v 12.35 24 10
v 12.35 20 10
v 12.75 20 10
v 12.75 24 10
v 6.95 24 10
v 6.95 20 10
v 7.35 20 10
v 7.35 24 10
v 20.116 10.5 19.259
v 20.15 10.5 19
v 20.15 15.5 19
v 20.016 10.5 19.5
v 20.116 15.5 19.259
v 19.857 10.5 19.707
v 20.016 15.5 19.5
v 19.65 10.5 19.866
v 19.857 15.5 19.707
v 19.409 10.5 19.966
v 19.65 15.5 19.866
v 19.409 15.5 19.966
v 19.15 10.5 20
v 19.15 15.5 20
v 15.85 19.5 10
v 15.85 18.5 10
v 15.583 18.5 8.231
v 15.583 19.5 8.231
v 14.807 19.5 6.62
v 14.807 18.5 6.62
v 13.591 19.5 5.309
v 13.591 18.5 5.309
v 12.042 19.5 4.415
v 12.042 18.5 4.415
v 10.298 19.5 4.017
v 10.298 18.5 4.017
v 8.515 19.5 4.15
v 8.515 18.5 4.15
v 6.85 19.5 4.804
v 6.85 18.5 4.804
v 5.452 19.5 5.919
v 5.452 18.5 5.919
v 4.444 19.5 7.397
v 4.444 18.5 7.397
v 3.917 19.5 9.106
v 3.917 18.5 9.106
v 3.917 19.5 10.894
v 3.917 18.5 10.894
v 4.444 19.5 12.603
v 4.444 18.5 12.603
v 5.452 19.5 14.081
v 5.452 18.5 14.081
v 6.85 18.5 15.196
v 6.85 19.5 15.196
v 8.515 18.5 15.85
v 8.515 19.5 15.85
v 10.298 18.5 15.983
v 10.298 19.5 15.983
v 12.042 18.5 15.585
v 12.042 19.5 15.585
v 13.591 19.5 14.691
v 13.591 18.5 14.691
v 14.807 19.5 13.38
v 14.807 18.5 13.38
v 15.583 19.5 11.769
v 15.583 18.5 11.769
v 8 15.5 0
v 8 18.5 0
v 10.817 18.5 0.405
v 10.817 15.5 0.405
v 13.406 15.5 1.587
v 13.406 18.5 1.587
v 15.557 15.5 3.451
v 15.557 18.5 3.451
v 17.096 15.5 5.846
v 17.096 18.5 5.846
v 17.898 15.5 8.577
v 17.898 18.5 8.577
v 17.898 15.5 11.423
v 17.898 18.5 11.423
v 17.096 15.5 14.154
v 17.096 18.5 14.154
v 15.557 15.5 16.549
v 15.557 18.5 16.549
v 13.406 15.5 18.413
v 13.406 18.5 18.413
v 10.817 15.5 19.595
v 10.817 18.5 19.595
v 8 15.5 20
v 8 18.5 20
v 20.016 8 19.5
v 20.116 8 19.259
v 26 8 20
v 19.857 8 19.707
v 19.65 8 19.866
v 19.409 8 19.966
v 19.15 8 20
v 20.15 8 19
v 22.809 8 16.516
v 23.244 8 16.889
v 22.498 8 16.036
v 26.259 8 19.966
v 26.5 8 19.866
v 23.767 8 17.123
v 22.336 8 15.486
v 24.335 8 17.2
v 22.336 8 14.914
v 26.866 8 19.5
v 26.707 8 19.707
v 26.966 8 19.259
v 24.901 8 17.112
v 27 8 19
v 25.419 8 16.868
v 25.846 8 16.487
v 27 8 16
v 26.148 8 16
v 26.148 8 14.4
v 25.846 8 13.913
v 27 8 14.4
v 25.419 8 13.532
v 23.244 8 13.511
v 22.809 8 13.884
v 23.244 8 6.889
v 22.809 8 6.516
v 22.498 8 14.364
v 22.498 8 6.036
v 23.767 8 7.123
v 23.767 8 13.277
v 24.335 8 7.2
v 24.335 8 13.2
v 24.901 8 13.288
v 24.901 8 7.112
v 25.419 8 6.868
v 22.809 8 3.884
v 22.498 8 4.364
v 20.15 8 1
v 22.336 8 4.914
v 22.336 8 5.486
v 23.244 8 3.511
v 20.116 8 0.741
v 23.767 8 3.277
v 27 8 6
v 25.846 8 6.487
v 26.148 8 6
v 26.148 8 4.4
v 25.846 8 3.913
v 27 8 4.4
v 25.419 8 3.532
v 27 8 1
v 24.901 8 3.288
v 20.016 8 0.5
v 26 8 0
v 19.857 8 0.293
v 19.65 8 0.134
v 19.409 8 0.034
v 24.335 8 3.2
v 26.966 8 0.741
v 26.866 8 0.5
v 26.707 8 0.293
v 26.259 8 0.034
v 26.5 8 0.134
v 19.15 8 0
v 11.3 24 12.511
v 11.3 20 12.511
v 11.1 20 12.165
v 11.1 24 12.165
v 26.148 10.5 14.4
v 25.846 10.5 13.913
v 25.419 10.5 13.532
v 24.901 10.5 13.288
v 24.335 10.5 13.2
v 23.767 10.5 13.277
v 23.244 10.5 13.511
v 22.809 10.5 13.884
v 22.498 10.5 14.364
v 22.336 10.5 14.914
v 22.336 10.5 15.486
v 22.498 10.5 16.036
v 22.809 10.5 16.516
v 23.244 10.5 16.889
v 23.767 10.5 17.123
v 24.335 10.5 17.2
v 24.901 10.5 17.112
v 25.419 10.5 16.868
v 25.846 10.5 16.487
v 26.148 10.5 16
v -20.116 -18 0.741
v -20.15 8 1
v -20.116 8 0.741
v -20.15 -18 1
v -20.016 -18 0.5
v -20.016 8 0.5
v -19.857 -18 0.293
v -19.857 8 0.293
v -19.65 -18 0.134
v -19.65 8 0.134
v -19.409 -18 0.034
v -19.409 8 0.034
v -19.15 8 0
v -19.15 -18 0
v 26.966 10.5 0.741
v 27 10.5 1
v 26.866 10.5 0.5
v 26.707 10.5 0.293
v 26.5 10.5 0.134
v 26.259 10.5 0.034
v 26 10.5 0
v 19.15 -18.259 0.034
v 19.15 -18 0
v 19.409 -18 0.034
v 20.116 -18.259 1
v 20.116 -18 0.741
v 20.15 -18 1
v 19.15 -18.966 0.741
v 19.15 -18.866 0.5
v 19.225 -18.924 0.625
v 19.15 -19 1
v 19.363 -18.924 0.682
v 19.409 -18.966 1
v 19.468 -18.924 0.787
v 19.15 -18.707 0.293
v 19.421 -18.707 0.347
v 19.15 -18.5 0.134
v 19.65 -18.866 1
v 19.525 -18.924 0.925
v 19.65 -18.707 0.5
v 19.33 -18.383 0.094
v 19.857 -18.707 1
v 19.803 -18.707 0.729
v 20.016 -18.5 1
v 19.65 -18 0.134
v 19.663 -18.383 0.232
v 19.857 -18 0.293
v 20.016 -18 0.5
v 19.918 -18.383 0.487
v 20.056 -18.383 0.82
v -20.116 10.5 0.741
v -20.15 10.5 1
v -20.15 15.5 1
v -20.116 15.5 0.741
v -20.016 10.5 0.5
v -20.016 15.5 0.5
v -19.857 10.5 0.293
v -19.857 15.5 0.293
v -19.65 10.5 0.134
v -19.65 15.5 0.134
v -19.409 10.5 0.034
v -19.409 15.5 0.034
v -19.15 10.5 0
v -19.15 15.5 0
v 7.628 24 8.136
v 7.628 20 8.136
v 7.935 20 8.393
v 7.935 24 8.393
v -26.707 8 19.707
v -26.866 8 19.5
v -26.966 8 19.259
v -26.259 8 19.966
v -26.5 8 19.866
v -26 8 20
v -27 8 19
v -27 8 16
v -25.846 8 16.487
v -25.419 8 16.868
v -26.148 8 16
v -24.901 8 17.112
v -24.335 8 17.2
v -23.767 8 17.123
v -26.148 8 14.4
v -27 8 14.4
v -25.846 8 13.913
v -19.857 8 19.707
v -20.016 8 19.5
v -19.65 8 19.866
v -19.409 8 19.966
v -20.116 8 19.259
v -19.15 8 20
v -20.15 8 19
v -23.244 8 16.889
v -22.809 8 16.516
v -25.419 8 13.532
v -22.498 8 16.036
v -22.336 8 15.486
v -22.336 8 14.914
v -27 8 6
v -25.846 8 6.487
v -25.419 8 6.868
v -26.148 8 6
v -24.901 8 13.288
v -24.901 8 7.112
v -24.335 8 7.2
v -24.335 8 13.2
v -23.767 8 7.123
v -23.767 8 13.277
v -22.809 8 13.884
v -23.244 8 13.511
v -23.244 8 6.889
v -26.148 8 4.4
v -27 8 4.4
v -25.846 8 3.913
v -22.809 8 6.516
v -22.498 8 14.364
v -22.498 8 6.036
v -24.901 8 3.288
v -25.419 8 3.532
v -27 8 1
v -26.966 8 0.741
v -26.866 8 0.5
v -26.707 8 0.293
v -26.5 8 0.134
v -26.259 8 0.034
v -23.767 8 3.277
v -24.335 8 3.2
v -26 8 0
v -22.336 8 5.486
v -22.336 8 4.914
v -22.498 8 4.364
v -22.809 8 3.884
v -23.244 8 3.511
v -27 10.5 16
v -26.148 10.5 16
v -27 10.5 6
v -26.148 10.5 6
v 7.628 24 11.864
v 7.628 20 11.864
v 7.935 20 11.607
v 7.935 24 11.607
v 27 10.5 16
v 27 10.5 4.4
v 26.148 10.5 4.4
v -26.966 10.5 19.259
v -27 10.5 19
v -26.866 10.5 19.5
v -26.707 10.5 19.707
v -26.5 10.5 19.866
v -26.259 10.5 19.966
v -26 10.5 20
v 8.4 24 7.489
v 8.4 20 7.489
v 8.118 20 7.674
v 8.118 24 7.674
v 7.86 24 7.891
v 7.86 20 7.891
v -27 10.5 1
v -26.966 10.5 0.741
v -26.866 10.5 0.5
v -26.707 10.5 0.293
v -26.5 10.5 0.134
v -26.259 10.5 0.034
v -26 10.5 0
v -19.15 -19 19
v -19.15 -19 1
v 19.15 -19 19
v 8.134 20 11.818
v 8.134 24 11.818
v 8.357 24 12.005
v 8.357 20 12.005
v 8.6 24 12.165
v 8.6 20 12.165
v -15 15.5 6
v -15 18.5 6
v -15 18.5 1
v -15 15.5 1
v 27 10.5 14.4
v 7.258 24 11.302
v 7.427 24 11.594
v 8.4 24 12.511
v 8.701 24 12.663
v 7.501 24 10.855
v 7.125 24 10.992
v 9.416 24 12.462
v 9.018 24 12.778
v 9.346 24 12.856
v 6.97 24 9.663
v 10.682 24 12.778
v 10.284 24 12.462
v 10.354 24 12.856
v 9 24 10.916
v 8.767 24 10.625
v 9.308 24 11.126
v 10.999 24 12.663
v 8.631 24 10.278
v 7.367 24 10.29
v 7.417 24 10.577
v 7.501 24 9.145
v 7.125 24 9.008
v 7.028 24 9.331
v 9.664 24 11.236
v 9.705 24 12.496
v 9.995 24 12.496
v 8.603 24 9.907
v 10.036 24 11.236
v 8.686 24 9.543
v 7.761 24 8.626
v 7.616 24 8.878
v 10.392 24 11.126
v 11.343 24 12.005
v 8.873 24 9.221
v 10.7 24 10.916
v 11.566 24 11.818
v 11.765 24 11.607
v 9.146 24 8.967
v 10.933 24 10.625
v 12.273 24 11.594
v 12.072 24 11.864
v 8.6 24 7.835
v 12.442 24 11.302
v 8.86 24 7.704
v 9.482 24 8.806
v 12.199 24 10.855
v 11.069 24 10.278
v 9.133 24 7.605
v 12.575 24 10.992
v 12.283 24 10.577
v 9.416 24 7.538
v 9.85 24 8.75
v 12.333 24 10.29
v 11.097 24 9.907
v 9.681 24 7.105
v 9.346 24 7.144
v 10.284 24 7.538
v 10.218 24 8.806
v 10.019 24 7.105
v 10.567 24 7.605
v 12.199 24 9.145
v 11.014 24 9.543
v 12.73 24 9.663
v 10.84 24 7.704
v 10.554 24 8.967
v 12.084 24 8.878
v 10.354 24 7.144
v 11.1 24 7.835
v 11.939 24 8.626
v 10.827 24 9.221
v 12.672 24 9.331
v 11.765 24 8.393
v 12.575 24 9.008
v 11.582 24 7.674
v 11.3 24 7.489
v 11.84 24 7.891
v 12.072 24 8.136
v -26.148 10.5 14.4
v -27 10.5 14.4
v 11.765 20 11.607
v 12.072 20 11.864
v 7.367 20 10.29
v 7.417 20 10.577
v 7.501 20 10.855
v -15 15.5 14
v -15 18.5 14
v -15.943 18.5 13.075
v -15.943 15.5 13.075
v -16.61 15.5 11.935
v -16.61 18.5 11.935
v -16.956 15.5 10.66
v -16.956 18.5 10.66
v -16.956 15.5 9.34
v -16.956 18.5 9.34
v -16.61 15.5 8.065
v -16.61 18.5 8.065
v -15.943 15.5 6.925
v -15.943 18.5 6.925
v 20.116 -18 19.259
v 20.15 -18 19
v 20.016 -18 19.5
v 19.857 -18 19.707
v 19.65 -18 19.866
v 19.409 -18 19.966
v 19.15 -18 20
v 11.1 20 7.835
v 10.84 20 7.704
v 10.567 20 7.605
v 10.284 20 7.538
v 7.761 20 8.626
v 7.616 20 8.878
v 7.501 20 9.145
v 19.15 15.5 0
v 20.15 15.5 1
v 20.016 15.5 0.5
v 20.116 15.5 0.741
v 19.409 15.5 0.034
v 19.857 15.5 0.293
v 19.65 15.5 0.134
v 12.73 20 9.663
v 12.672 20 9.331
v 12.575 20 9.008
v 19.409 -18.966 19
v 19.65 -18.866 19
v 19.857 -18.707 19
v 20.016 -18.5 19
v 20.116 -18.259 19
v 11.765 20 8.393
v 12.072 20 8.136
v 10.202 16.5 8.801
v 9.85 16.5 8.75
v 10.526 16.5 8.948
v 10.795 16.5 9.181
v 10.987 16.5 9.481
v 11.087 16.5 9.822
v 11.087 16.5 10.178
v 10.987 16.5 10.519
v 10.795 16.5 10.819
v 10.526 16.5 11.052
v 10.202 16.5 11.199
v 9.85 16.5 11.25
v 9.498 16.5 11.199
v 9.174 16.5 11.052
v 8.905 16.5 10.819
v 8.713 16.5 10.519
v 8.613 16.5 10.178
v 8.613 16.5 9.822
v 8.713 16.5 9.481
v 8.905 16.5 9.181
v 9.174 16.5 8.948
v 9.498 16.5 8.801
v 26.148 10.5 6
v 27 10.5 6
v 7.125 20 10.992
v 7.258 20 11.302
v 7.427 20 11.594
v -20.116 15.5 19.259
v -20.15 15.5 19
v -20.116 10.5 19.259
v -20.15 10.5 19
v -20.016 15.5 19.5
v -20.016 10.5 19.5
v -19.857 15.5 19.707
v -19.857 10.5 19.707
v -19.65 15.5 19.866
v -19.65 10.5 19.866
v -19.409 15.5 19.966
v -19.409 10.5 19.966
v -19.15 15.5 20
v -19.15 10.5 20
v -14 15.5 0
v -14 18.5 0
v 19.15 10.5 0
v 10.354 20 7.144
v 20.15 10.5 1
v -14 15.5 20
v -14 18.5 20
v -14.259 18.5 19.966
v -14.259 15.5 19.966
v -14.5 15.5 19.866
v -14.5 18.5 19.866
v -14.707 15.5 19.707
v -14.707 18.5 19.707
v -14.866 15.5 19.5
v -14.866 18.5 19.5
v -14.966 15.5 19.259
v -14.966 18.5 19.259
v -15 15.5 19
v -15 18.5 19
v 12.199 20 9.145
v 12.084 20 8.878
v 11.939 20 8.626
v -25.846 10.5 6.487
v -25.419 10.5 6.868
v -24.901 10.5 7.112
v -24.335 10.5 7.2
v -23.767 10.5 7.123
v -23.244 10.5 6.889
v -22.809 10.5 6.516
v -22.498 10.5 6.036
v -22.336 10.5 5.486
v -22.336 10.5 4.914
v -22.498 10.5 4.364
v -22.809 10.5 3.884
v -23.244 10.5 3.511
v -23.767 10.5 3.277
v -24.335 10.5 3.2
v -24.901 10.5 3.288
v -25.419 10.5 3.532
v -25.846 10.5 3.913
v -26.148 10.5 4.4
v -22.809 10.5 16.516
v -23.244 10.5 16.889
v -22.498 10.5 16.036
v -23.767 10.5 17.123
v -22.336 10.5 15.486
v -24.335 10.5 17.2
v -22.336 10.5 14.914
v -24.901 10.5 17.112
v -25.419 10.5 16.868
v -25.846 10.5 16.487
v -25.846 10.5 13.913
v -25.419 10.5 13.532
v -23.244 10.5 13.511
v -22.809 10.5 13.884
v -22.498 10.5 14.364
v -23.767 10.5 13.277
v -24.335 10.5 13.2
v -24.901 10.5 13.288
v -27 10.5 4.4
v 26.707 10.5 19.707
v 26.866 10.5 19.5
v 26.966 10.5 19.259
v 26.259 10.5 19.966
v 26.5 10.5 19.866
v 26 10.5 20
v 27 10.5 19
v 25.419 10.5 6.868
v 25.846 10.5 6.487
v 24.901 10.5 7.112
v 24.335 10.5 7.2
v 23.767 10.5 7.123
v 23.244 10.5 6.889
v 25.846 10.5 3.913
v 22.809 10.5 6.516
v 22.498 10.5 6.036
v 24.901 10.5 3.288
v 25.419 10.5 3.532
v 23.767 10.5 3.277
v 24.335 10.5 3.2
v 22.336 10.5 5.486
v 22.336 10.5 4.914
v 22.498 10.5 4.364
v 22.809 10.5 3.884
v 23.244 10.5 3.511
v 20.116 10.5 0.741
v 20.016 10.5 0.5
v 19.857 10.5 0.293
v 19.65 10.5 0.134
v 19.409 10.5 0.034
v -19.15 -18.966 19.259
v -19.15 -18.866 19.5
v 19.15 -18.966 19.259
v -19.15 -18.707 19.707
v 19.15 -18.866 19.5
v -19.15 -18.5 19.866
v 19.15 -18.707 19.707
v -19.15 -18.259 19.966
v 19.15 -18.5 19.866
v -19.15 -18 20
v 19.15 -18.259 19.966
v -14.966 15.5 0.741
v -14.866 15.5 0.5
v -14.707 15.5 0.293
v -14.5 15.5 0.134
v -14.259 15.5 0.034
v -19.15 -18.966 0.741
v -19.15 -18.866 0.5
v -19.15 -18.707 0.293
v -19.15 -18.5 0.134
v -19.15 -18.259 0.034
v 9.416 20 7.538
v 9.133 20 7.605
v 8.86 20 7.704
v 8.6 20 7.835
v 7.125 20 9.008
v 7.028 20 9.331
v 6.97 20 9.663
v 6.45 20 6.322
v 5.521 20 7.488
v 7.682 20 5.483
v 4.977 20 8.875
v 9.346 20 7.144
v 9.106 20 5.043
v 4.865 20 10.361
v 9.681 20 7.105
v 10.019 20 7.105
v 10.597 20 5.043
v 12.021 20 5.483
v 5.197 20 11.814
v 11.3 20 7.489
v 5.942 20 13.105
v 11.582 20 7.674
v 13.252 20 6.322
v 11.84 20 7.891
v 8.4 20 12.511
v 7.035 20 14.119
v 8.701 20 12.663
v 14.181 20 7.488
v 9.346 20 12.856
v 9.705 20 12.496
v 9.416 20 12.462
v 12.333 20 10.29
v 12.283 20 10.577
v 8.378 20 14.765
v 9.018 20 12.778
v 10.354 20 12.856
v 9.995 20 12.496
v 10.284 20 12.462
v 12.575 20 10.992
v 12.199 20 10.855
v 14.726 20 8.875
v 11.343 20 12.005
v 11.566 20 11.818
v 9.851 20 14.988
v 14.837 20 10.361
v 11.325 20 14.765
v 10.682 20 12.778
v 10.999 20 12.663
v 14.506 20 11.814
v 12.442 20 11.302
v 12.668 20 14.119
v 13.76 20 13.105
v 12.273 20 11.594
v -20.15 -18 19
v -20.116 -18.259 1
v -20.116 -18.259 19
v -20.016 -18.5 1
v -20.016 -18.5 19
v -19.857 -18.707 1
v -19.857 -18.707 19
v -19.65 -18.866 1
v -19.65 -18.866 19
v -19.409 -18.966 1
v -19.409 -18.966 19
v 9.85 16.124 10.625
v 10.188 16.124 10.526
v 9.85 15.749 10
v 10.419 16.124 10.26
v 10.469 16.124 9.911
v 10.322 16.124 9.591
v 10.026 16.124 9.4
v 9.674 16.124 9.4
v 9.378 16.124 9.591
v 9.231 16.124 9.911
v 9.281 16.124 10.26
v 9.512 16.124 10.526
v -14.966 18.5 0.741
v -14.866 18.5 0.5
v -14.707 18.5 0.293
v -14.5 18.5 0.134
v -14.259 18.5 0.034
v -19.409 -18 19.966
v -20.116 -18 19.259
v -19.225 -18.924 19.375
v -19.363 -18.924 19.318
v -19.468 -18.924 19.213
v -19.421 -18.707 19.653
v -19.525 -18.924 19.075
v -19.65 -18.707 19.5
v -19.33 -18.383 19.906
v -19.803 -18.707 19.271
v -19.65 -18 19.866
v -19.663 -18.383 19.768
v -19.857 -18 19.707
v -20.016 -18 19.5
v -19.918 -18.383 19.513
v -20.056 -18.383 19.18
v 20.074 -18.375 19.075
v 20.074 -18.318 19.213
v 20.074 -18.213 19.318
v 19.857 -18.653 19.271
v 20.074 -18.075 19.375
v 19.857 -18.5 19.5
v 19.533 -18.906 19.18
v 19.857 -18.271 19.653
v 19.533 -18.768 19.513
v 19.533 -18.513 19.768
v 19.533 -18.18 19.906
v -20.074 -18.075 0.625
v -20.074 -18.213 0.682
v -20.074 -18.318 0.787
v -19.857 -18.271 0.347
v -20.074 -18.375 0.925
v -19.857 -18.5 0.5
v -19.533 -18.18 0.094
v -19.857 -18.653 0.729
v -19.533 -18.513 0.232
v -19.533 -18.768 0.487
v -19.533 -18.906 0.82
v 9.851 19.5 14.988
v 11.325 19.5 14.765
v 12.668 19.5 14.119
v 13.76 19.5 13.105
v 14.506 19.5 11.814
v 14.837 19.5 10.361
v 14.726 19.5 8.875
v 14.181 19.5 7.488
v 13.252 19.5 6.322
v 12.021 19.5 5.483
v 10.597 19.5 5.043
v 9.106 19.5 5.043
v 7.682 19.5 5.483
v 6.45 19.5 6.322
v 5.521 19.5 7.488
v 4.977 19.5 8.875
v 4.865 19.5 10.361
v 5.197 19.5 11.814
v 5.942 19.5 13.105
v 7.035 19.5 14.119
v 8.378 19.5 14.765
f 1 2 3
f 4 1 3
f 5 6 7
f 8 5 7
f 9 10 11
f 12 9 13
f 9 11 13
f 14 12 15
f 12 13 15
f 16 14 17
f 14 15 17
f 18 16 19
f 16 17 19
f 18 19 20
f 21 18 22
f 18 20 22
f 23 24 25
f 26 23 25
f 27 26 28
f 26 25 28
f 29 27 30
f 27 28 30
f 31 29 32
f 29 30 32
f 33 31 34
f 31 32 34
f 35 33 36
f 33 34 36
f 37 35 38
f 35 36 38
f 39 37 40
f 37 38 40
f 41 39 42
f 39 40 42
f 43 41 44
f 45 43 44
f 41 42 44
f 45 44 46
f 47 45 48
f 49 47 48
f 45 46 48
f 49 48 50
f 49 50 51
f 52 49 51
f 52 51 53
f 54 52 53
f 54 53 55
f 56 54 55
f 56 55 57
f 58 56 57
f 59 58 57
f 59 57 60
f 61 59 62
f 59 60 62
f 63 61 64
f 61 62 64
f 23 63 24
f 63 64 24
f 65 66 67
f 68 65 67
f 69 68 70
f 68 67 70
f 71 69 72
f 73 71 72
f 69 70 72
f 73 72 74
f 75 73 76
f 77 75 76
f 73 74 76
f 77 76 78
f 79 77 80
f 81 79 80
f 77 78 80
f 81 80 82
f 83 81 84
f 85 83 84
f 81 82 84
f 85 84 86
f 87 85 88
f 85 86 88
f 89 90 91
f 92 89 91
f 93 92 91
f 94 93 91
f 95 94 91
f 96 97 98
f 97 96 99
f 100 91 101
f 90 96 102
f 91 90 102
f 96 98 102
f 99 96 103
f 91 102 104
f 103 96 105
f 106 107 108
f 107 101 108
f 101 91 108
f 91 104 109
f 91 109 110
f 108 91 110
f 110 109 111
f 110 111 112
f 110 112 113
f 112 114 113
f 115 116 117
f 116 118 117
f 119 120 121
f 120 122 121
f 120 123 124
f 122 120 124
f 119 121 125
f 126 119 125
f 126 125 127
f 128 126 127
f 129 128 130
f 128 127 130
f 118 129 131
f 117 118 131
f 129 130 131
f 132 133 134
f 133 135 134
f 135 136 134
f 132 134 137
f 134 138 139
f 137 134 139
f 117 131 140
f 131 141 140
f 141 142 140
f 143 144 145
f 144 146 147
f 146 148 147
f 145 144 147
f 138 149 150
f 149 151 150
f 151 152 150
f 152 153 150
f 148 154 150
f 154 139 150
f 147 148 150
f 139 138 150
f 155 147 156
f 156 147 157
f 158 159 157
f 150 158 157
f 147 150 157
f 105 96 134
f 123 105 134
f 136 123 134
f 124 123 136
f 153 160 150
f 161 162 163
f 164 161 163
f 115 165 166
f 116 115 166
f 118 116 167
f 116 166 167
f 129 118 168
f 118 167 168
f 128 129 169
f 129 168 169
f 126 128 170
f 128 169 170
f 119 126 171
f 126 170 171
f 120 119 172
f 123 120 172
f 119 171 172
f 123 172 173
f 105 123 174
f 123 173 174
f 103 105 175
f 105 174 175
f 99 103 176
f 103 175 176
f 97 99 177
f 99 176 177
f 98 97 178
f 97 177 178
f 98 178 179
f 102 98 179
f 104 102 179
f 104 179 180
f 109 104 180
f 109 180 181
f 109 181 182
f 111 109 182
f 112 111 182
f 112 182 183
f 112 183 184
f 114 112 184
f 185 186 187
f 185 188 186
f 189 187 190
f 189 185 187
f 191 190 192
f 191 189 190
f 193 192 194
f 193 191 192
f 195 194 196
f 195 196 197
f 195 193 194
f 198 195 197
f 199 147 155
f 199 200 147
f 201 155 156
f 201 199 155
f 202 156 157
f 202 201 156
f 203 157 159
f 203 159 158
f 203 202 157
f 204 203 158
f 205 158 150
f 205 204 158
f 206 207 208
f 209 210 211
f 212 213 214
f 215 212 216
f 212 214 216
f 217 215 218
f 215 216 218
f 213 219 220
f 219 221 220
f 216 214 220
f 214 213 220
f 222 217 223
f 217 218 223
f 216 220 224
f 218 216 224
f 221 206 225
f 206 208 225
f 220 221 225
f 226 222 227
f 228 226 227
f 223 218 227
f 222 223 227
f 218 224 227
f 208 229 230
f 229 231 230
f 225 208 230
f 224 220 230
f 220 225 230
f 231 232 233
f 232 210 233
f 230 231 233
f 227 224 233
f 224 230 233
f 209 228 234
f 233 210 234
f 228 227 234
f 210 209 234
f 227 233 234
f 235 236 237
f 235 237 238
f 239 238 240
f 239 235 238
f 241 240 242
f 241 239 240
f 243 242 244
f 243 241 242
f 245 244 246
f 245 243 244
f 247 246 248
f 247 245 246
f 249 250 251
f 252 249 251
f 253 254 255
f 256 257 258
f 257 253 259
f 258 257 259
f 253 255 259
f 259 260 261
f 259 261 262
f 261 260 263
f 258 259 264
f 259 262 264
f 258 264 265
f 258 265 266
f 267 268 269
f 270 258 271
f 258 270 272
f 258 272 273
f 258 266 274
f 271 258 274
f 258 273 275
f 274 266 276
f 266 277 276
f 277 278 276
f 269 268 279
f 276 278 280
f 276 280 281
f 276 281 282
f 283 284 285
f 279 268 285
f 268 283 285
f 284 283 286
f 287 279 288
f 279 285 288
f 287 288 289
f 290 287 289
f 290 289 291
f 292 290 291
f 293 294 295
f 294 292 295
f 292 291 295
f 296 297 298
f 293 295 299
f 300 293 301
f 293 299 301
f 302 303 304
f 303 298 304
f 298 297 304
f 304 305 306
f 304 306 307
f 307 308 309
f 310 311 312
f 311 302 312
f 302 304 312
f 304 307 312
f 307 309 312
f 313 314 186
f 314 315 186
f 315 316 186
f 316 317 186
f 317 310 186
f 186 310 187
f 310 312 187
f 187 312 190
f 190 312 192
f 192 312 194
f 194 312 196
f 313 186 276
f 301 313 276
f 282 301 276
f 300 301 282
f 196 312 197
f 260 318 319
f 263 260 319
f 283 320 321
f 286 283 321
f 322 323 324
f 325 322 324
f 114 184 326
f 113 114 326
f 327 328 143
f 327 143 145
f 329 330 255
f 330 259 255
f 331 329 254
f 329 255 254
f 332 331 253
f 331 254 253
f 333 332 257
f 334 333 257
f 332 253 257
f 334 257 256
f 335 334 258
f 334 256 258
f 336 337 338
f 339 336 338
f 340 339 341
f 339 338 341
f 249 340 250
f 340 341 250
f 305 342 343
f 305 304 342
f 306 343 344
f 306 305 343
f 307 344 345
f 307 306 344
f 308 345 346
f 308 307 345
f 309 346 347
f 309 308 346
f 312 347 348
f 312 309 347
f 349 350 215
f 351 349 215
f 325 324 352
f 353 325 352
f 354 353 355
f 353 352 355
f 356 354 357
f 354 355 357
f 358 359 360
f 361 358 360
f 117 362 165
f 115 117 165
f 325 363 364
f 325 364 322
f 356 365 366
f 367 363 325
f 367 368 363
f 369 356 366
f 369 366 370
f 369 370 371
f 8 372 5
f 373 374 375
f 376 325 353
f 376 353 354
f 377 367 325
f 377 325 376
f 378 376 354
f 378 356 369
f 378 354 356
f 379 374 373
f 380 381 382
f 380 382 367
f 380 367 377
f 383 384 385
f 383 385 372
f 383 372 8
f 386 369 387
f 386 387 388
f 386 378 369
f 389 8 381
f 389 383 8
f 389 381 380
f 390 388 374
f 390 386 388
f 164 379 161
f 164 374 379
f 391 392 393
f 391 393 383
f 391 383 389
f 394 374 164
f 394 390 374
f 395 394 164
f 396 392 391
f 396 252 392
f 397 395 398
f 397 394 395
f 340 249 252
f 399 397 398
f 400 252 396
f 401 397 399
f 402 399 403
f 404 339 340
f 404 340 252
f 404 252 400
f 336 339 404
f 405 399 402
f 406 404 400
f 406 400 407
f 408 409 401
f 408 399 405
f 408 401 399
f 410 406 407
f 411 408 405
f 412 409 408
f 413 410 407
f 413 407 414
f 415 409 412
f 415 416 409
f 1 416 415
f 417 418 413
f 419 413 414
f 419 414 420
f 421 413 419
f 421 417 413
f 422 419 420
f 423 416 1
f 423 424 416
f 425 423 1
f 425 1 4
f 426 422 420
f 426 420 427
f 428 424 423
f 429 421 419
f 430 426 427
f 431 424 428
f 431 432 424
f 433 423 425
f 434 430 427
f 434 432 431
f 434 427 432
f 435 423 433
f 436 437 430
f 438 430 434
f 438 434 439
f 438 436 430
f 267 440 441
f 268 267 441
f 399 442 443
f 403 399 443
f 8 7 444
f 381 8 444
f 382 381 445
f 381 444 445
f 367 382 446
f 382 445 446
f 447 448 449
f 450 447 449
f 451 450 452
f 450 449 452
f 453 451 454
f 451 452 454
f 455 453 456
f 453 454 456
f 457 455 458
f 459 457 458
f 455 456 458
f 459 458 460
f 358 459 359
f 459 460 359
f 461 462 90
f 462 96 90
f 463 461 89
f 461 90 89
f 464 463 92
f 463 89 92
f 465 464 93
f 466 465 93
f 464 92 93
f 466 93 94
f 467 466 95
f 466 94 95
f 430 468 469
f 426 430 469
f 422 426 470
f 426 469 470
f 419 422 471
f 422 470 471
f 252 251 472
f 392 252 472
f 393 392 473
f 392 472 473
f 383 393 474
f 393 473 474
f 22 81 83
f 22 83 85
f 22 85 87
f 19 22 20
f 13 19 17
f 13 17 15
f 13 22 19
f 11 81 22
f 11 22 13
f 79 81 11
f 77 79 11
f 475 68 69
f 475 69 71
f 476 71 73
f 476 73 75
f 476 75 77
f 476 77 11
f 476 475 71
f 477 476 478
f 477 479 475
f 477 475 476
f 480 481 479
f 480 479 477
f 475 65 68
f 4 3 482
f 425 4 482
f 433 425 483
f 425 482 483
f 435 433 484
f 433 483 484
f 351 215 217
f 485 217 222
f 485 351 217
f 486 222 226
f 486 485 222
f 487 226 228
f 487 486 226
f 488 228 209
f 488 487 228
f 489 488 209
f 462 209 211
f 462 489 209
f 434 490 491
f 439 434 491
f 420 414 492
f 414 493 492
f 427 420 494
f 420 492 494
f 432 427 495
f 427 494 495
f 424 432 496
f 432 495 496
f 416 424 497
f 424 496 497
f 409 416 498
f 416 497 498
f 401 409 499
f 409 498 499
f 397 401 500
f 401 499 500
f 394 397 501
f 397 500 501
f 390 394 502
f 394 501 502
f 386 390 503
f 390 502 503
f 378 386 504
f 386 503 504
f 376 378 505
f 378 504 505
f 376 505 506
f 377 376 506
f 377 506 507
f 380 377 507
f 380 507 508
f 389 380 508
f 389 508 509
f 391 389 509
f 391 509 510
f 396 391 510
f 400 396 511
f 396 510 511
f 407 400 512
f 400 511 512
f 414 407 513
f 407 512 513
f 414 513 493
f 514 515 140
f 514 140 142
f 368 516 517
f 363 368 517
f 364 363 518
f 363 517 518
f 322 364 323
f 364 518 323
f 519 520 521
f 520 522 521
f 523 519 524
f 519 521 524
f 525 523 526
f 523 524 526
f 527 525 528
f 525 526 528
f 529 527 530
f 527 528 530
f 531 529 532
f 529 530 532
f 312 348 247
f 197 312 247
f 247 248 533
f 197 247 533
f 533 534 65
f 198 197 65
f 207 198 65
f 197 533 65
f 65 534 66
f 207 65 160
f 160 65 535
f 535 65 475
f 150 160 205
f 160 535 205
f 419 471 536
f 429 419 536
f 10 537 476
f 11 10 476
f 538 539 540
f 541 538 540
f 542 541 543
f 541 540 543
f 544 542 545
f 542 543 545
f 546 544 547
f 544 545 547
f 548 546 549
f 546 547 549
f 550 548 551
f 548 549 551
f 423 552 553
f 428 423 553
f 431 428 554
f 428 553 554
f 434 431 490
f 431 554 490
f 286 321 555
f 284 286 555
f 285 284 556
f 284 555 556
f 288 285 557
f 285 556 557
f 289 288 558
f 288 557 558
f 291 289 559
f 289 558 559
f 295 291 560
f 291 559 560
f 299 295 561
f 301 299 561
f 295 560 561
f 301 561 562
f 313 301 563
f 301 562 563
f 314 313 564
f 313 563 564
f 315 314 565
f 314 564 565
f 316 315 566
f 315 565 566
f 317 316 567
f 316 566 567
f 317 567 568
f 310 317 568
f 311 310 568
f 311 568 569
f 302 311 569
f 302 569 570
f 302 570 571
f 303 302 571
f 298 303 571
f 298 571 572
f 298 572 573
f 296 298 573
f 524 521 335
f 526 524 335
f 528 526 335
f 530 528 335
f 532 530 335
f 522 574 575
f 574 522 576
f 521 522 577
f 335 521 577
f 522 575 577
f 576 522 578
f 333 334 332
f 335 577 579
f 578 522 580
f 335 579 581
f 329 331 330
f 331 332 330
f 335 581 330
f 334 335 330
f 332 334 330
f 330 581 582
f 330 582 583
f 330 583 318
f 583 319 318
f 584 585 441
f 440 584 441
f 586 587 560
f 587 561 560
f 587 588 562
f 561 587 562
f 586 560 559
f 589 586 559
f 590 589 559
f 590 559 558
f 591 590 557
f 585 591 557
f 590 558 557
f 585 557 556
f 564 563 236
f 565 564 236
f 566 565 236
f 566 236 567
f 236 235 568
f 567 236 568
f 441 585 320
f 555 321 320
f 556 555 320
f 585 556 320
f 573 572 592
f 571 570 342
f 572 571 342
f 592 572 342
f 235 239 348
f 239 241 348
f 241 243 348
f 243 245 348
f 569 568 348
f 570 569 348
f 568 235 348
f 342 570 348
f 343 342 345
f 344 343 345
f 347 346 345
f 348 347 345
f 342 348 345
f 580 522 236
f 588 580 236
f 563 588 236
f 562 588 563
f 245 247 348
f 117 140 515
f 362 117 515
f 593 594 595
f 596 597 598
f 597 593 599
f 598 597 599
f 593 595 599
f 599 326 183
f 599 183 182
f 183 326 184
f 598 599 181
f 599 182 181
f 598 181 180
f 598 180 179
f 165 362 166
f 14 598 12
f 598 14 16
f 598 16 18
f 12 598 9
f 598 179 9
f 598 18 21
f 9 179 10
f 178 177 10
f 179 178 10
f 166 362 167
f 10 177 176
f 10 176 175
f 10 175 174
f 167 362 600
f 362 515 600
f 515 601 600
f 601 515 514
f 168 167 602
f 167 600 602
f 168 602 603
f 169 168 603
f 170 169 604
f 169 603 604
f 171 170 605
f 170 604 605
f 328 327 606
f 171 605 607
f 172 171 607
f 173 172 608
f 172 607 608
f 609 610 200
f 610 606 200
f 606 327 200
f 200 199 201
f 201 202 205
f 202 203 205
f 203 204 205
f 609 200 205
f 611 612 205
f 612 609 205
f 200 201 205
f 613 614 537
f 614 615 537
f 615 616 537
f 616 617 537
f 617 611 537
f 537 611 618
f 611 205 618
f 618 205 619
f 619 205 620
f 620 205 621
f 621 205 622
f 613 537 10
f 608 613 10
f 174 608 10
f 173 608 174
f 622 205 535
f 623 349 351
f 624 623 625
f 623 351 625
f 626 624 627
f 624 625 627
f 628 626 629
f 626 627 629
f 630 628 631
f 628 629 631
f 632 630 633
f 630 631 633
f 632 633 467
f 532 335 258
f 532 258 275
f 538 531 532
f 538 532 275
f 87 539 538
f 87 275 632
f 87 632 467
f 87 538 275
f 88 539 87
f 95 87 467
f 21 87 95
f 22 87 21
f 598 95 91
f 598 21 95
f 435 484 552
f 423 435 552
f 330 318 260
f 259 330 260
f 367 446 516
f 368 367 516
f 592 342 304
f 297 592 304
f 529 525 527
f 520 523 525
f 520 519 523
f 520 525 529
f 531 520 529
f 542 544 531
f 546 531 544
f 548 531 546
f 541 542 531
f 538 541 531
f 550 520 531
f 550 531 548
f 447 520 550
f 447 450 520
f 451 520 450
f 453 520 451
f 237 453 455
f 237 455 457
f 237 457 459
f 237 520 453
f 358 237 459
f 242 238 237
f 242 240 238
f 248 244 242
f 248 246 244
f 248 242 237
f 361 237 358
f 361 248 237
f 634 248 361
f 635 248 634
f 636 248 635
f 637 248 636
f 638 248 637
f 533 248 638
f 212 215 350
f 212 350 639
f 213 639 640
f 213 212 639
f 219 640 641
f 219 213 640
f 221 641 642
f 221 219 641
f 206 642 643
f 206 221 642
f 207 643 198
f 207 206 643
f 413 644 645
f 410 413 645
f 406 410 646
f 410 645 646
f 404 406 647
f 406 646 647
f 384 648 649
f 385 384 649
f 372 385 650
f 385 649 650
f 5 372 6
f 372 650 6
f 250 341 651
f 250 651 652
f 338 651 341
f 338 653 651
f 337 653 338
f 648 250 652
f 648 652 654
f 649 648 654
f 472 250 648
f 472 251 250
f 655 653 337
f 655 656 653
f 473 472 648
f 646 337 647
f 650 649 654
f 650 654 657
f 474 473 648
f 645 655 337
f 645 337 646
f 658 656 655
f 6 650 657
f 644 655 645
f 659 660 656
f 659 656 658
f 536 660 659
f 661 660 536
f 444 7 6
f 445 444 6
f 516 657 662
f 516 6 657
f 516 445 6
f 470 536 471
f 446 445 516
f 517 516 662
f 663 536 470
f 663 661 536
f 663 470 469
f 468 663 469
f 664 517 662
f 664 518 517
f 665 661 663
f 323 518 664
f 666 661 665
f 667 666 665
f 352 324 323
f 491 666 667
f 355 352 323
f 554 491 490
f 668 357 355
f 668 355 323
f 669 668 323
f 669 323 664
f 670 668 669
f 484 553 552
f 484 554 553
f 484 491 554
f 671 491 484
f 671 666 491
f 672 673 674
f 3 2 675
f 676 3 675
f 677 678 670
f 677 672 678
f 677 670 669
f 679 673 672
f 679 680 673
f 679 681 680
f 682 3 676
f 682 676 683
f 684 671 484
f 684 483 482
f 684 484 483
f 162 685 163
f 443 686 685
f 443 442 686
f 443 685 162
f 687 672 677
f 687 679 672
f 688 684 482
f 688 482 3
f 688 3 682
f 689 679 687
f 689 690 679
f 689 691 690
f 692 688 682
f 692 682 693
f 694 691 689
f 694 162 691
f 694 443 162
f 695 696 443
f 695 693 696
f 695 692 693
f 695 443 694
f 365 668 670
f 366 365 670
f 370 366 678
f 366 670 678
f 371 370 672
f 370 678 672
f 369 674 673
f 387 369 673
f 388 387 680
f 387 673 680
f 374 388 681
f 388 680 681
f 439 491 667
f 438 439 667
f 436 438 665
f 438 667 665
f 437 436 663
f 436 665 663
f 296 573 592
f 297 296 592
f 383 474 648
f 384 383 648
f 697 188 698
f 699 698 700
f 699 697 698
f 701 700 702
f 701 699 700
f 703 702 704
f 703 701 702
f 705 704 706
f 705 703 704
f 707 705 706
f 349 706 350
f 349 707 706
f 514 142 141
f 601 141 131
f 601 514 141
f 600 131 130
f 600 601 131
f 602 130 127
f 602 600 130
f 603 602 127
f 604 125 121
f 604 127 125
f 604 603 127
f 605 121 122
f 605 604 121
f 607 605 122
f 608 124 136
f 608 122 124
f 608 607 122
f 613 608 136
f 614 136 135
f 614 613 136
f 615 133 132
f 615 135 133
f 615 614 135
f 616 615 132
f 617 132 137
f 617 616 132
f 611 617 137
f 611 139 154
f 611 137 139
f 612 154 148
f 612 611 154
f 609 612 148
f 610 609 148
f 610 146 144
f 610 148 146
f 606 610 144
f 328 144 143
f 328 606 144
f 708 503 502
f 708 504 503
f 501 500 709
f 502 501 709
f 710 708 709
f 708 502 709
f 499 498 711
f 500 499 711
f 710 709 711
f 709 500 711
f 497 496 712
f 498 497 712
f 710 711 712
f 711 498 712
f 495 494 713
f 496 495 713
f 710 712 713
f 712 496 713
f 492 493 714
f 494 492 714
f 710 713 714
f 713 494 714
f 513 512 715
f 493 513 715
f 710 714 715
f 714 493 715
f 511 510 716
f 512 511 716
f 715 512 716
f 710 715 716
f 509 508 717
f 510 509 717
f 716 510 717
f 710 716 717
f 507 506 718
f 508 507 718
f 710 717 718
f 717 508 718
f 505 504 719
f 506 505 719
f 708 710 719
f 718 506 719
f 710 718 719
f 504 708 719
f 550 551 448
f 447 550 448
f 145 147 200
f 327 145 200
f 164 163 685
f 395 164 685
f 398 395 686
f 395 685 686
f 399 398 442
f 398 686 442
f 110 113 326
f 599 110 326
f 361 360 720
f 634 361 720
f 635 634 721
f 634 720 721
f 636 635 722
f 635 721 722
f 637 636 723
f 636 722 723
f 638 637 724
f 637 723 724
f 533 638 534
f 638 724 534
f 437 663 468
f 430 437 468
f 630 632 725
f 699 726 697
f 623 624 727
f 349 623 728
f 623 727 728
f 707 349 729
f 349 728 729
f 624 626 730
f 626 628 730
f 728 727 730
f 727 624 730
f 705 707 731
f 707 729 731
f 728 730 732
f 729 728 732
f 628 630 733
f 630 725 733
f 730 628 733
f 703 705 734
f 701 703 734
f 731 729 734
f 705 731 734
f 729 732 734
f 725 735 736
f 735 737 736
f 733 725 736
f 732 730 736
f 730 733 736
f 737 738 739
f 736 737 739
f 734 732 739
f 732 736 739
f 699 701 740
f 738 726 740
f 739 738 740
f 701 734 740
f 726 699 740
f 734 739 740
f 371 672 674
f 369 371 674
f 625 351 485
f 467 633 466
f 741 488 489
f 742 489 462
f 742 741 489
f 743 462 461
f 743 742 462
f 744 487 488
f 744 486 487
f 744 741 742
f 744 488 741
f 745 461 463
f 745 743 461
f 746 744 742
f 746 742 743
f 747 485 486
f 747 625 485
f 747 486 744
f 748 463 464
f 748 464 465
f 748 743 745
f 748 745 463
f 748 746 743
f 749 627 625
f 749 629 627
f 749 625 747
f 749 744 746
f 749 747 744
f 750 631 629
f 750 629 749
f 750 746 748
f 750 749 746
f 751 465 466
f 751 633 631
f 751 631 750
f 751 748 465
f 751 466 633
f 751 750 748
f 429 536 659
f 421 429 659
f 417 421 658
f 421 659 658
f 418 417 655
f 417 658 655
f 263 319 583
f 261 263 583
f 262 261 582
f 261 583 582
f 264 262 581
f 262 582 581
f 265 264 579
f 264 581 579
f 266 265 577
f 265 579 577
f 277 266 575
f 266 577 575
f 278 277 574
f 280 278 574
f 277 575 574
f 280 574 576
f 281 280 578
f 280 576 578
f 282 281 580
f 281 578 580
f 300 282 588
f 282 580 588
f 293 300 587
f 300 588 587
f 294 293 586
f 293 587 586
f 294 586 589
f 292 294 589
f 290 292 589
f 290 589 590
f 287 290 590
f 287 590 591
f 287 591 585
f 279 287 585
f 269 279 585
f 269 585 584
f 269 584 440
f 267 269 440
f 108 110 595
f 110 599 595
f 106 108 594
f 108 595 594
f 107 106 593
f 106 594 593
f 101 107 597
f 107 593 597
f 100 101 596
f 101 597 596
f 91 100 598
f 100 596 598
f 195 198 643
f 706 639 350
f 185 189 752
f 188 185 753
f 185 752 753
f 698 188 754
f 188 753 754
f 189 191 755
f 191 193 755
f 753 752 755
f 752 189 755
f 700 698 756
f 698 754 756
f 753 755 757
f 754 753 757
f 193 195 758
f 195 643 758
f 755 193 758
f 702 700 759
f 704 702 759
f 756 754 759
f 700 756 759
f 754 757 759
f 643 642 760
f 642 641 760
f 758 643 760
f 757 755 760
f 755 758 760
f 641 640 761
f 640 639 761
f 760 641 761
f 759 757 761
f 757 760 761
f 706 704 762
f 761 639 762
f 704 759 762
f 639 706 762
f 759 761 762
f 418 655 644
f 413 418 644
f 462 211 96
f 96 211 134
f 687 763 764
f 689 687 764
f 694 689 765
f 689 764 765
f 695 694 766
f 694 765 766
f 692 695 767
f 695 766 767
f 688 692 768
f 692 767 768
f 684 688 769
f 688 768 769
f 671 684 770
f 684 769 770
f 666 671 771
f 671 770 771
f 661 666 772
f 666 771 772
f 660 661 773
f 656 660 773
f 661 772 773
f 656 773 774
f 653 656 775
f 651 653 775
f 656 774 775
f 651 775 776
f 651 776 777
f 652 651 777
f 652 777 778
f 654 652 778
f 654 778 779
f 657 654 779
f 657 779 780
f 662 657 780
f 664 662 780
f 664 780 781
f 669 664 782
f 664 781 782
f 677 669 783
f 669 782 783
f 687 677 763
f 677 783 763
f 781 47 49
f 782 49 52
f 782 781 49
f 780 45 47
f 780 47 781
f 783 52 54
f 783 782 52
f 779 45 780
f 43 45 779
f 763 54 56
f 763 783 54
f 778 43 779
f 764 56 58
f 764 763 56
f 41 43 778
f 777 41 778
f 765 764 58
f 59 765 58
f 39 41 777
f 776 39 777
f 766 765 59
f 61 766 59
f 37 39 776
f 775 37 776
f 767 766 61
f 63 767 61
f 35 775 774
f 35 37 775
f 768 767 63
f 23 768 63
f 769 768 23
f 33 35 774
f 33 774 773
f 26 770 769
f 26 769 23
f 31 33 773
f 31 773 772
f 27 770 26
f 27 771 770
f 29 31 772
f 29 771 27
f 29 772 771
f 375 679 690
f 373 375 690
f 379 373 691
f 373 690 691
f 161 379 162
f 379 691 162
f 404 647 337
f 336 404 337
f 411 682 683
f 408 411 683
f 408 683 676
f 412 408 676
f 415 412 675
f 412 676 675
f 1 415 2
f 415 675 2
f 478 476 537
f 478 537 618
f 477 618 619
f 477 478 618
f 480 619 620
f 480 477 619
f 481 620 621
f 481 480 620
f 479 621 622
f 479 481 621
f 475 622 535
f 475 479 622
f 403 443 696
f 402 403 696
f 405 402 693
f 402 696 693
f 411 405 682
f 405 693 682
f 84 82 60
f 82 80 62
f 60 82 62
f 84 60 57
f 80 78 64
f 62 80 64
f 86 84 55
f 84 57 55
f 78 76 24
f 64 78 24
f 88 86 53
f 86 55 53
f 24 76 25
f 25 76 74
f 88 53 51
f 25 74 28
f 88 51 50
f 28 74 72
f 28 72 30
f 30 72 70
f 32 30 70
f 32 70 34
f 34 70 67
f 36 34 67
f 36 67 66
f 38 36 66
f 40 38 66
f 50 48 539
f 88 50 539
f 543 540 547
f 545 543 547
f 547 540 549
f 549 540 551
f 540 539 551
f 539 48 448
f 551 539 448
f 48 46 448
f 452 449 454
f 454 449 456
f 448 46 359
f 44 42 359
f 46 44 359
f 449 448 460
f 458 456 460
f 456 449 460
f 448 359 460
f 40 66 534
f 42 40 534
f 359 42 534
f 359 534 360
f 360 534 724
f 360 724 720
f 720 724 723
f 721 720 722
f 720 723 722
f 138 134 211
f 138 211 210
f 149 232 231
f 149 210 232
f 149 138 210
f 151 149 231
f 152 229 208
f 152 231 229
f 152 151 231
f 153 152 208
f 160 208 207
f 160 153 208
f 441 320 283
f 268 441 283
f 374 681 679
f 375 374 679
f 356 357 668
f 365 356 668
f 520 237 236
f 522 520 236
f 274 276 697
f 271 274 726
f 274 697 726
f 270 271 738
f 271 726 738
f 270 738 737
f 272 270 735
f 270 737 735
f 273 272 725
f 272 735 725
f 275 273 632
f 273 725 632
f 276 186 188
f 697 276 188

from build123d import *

# Parameters (mm, degrees)
EXTRUDE_1_DEPTH        = 20
FILLET_1_R             = 1
CUT_EXTRUDE_1_DEPTH    = 20
SKETCH_3_W             = 51.867663345
SKETCH_3_H             = 35.261757523
CUT_EXTRUDE_2_DEPTH    = 3
SKETCH_4_R             = 6
EXTRUDE_2_DEPTH        = 1
SKETCH_5_R             = 5
EXTRUDE_3_DEPTH        = 0.5
SKETCH_6_R             = 1
EXTRUDE_4_DEPTH        = 4
HOLE_WIZARD_M3_1_D     = 2.5
HOLE_WIZARD_M3_1_DEPTH = 7.5
HOLE_WIZARD_M3_1_TIP   = 0.751075774


with BuildPart() as part:
    # 草图1 → 凸台-拉伸1 (new body)
    with BuildSketch(Plane.XY):
        Polygon((20.15, 8), (27, 8), (27, 10.5), (20.15, 10.5), (20.15, 18.5), (-20.15, 18.5), (-20.15, 10.5), (-27, 10.5), (-27, 8), (-20.15, 8), (-20.15, -19), (20.15, -19), align=None)
    extrude(amount=EXTRUDE_1_DEPTH)

    # 圆角1
    fillet_1_edges = [part.edges().sort_by_distance(p)[0] for p in [
        (-27, 9.25, 20),
        (20.15, 14.5, 0),
        (27, 9.25, 0),
        (20.15, -5.5, 0),
        (0, -19, 0),
        (-20.15, -5.5, 0),
        (-27, 9.25, 0),
        (-20.15, 14.5, 0),
        (-20.15, -5.5, 20),
        (0, -19, 20),
        (-20.15, 18.5, 10),
        (20.15, 18.5, 10),
        (20.15, -19, 10),
        (-20.15, -19, 10),
        (20.15, -5.5, 20),
        (27, 9.25, 20),
        (20.15, 14.5, 20),
        (-20.15, 14.5, 20),
    ]]
    fillet(fillet_1_edges, radius=FILLET_1_R)

    # 草图2 → 切除-拉伸1 (cut)
    with BuildSketch(Plane(origin=(0, 10.5, 0), x_dir=(1, 0, 0), z_dir=(0, 1, 0))):
        with BuildLine():
            Line((-26.148030278, -4.4), (-29.222738853, -4.4))
            Line((-29.222738853, -4.4), (-29.222738853, -6))
            Line((-29.222738853, -6), (-26.148030278, -6))
            ThreePointArc((-26.148030278, -6), (-22.315, -5.2), (-26.148030278, -4.4))
        make_face()
        with BuildLine():
            Line((-26.148030278, -14.4), (-29.222738853, -14.4))
            Line((-29.222738853, -14.4), (-29.222738853, -16))
            Line((-29.222738853, -16), (-26.148030278, -16))
            ThreePointArc((-26.148030278, -16), (-22.315, -15.2), (-26.148030278, -14.4))
        make_face()
        with BuildLine():
            Line((26.148030278, -16), (29.222738853, -16))
            Line((29.222738853, -16), (29.222738853, -14.4))
            Line((29.222738853, -14.4), (26.148030278, -14.4))
            ThreePointArc((26.148030278, -14.4), (22.315, -15.2), (26.148030278, -16))
        make_face()
        with BuildLine():
            Line((29.222738853, -4.4), (29.222738853, -6))
            Line((29.222738853, -6), (26.148030278, -6))
            ThreePointArc((26.148030278, -6), (22.315, -5.2), (26.148030278, -4.4))
            Line((26.148030278, -4.4), (29.222738853, -4.4))
        make_face()
    extrude(amount=-CUT_EXTRUDE_1_DEPTH, mode=Mode.SUBTRACT)

    # 草图3 → 切除-拉伸2 (cut)
    with BuildSketch(Plane(origin=(0, 18.5, 0), x_dir=(1, 0, 0), z_dir=(0, 1, 0))):
        with Locations((-0.933831673, -10.85793672)):
            Rectangle(SKETCH_3_W, SKETCH_3_H)
        with BuildLine():
            Line((-14, 0), (8, 0))
            ThreePointArc((8, 0), (18, -10), (8, -20))
            Line((8, -20), (-14, -20))
            ThreePointArc((-14, -20), (-14.707106781, -19.707106781), (-15, -19))
            Line((-15, -19), (-15, -14))
            ThreePointArc((-15, -14), (-17, -10), (-15, -6))
            Line((-15, -6), (-15, -1))
            ThreePointArc((-15, -1), (-14.707106781, -0.292893219), (-14, 0))
        make_face(mode=Mode.SUBTRACT)
    extrude(amount=-CUT_EXTRUDE_2_DEPTH, mode=Mode.SUBTRACT)

    # 草图4 → 凸台-拉伸2 (add)
    with BuildSketch(Plane(origin=(0, 18.5, 0), x_dir=(1, 0, 0), z_dir=(0, 1, 0))):
        with Locations((9.85, -10)):
            Circle(SKETCH_4_R)
    extrude(amount=EXTRUDE_2_DEPTH)

    # 草图5 → 凸台-拉伸3 (add)
    with BuildSketch(Plane(origin=(0, 19.5, 0), x_dir=(1, 0, 0), z_dir=(0, 1, 0))):
        with Locations(Location((9.851314919, -9.987632383, 0), (0, 0, 270))):
            Circle(SKETCH_5_R)
    extrude(amount=EXTRUDE_3_DEPTH)

    # 草图6 → 凸台-拉伸4 (add)
    with BuildSketch(Plane(origin=(0, 20, 0), x_dir=(1, 0, 0), z_dir=(0, 1, 0))):
        with BuildLine():
            Line((10.284120444, -7.537980617), (10.353579715, -7.144057516))
            ThreePointArc((10.353579715, -7.144057516), (9.85, -7.1), (9.346420285, -7.144057516))
            Line((9.346420285, -7.144057516), (9.415879556, -7.537980617))
            ThreePointArc((9.415879556, -7.537980617), (8.994949642, -7.650768448), (8.6, -7.834936491))
            Line((8.6, -7.834936491), (8.4, -7.488526329))
            ThreePointArc((8.4, -7.488526329), (7.985915932, -7.778471115), (7.628471115, -8.135915932))
            Line((7.628471115, -8.135915932), (7.934888892, -8.393030976))
            ThreePointArc((7.934888892, -8.393030976), (7.684936491, -8.75), (7.500768448, -9.144949642))
            Line((7.500768448, -9.144949642), (7.1248914, -9.008141584))
            ThreePointArc((7.1248914, -9.008141584), (6.994057516, -9.496420285), (6.95, -10))
            Line((6.95, -10), (7.35, -10))
            ThreePointArc((7.35, -10), (7.387980617, -10.434120444), (7.500768448, -10.855050358))
            Line((7.500768448, -10.855050358), (7.1248914, -10.991858416))
            ThreePointArc((7.1248914, -10.991858416), (7.338526329, -11.45), (7.628471115, -11.864084068))
            Line((7.628471115, -11.864084068), (7.934888892, -11.606969024))
            ThreePointArc((7.934888892, -11.606969024), (8.243030976, -11.915111108), (8.6, -12.165063509))
            Line((8.6, -12.165063509), (8.4, -12.511473671))
            ThreePointArc((8.4, -12.511473671), (8.858141584, -12.7251086), (9.346420285, -12.855942484))
            Line((9.346420285, -12.855942484), (9.415879556, -12.462019383))
            ThreePointArc((9.415879556, -12.462019383), (9.85, -12.5), (10.284120444, -12.462019383))
            Line((10.284120444, -12.462019383), (10.353579715, -12.855942484))
            ThreePointArc((10.353579715, -12.855942484), (10.841858416, -12.7251086), (11.3, -12.511473671))
            Line((11.3, -12.511473671), (11.1, -12.165063509))
            ThreePointArc((11.1, -12.165063509), (11.456969024, -11.915111108), (11.765111108, -11.606969024))
            Line((11.765111108, -11.606969024), (12.071528885, -11.864084068))
            ThreePointArc((12.071528885, -11.864084068), (12.361473671, -11.45), (12.5751086, -10.991858416))
            Line((12.5751086, -10.991858416), (12.199231552, -10.855050358))
            ThreePointArc((12.199231552, -10.855050358), (12.312019383, -10.434120444), (12.35, -10))
            Line((12.35, -10), (12.75, -10))
            ThreePointArc((12.75, -10), (12.705942484, -9.496420285), (12.5751086, -9.008141584))
            Line((12.5751086, -9.008141584), (12.199231552, -9.144949642))
            ThreePointArc((12.199231552, -9.144949642), (12.015063509, -8.75), (11.765111108, -8.393030976))
            Line((11.765111108, -8.393030976), (12.071528885, -8.135915932))
            ThreePointArc((12.071528885, -8.135915932), (11.714084068, -7.778471115), (11.3, -7.488526329))
            Line((11.3, -7.488526329), (11.1, -7.834936491))
            ThreePointArc((11.1, -7.834936491), (10.705050358, -7.650768448), (10.284120444, -7.537980617))
        make_face()
        with Locations(Location((9.85, -10, 0), (0, 0, 270))):
            Circle(SKETCH_6_R, mode=Mode.SUBTRACT)
    extrude(amount=EXTRUDE_4_DEPTH)

    # M3 螺纹孔1
    with Locations(Plane(origin=(9.85, 24, 10), x_dir=(0, 0, 1), z_dir=(0, 1, 0))):
        with Locations((0, 0)):
            Hole(HOLE_WIZARD_M3_1_D / 2, depth=HOLE_WIZARD_M3_1_DEPTH)
            with Locations((0, 0, -(HOLE_WIZARD_M3_1_DEPTH + HOLE_WIZARD_M3_1_TIP / 2))):  # 118° drill point
                Cone(0, HOLE_WIZARD_M3_1_D / 2, HOLE_WIZARD_M3_1_TIP, mode=Mode.SUBTRACT)


solid = part.part
